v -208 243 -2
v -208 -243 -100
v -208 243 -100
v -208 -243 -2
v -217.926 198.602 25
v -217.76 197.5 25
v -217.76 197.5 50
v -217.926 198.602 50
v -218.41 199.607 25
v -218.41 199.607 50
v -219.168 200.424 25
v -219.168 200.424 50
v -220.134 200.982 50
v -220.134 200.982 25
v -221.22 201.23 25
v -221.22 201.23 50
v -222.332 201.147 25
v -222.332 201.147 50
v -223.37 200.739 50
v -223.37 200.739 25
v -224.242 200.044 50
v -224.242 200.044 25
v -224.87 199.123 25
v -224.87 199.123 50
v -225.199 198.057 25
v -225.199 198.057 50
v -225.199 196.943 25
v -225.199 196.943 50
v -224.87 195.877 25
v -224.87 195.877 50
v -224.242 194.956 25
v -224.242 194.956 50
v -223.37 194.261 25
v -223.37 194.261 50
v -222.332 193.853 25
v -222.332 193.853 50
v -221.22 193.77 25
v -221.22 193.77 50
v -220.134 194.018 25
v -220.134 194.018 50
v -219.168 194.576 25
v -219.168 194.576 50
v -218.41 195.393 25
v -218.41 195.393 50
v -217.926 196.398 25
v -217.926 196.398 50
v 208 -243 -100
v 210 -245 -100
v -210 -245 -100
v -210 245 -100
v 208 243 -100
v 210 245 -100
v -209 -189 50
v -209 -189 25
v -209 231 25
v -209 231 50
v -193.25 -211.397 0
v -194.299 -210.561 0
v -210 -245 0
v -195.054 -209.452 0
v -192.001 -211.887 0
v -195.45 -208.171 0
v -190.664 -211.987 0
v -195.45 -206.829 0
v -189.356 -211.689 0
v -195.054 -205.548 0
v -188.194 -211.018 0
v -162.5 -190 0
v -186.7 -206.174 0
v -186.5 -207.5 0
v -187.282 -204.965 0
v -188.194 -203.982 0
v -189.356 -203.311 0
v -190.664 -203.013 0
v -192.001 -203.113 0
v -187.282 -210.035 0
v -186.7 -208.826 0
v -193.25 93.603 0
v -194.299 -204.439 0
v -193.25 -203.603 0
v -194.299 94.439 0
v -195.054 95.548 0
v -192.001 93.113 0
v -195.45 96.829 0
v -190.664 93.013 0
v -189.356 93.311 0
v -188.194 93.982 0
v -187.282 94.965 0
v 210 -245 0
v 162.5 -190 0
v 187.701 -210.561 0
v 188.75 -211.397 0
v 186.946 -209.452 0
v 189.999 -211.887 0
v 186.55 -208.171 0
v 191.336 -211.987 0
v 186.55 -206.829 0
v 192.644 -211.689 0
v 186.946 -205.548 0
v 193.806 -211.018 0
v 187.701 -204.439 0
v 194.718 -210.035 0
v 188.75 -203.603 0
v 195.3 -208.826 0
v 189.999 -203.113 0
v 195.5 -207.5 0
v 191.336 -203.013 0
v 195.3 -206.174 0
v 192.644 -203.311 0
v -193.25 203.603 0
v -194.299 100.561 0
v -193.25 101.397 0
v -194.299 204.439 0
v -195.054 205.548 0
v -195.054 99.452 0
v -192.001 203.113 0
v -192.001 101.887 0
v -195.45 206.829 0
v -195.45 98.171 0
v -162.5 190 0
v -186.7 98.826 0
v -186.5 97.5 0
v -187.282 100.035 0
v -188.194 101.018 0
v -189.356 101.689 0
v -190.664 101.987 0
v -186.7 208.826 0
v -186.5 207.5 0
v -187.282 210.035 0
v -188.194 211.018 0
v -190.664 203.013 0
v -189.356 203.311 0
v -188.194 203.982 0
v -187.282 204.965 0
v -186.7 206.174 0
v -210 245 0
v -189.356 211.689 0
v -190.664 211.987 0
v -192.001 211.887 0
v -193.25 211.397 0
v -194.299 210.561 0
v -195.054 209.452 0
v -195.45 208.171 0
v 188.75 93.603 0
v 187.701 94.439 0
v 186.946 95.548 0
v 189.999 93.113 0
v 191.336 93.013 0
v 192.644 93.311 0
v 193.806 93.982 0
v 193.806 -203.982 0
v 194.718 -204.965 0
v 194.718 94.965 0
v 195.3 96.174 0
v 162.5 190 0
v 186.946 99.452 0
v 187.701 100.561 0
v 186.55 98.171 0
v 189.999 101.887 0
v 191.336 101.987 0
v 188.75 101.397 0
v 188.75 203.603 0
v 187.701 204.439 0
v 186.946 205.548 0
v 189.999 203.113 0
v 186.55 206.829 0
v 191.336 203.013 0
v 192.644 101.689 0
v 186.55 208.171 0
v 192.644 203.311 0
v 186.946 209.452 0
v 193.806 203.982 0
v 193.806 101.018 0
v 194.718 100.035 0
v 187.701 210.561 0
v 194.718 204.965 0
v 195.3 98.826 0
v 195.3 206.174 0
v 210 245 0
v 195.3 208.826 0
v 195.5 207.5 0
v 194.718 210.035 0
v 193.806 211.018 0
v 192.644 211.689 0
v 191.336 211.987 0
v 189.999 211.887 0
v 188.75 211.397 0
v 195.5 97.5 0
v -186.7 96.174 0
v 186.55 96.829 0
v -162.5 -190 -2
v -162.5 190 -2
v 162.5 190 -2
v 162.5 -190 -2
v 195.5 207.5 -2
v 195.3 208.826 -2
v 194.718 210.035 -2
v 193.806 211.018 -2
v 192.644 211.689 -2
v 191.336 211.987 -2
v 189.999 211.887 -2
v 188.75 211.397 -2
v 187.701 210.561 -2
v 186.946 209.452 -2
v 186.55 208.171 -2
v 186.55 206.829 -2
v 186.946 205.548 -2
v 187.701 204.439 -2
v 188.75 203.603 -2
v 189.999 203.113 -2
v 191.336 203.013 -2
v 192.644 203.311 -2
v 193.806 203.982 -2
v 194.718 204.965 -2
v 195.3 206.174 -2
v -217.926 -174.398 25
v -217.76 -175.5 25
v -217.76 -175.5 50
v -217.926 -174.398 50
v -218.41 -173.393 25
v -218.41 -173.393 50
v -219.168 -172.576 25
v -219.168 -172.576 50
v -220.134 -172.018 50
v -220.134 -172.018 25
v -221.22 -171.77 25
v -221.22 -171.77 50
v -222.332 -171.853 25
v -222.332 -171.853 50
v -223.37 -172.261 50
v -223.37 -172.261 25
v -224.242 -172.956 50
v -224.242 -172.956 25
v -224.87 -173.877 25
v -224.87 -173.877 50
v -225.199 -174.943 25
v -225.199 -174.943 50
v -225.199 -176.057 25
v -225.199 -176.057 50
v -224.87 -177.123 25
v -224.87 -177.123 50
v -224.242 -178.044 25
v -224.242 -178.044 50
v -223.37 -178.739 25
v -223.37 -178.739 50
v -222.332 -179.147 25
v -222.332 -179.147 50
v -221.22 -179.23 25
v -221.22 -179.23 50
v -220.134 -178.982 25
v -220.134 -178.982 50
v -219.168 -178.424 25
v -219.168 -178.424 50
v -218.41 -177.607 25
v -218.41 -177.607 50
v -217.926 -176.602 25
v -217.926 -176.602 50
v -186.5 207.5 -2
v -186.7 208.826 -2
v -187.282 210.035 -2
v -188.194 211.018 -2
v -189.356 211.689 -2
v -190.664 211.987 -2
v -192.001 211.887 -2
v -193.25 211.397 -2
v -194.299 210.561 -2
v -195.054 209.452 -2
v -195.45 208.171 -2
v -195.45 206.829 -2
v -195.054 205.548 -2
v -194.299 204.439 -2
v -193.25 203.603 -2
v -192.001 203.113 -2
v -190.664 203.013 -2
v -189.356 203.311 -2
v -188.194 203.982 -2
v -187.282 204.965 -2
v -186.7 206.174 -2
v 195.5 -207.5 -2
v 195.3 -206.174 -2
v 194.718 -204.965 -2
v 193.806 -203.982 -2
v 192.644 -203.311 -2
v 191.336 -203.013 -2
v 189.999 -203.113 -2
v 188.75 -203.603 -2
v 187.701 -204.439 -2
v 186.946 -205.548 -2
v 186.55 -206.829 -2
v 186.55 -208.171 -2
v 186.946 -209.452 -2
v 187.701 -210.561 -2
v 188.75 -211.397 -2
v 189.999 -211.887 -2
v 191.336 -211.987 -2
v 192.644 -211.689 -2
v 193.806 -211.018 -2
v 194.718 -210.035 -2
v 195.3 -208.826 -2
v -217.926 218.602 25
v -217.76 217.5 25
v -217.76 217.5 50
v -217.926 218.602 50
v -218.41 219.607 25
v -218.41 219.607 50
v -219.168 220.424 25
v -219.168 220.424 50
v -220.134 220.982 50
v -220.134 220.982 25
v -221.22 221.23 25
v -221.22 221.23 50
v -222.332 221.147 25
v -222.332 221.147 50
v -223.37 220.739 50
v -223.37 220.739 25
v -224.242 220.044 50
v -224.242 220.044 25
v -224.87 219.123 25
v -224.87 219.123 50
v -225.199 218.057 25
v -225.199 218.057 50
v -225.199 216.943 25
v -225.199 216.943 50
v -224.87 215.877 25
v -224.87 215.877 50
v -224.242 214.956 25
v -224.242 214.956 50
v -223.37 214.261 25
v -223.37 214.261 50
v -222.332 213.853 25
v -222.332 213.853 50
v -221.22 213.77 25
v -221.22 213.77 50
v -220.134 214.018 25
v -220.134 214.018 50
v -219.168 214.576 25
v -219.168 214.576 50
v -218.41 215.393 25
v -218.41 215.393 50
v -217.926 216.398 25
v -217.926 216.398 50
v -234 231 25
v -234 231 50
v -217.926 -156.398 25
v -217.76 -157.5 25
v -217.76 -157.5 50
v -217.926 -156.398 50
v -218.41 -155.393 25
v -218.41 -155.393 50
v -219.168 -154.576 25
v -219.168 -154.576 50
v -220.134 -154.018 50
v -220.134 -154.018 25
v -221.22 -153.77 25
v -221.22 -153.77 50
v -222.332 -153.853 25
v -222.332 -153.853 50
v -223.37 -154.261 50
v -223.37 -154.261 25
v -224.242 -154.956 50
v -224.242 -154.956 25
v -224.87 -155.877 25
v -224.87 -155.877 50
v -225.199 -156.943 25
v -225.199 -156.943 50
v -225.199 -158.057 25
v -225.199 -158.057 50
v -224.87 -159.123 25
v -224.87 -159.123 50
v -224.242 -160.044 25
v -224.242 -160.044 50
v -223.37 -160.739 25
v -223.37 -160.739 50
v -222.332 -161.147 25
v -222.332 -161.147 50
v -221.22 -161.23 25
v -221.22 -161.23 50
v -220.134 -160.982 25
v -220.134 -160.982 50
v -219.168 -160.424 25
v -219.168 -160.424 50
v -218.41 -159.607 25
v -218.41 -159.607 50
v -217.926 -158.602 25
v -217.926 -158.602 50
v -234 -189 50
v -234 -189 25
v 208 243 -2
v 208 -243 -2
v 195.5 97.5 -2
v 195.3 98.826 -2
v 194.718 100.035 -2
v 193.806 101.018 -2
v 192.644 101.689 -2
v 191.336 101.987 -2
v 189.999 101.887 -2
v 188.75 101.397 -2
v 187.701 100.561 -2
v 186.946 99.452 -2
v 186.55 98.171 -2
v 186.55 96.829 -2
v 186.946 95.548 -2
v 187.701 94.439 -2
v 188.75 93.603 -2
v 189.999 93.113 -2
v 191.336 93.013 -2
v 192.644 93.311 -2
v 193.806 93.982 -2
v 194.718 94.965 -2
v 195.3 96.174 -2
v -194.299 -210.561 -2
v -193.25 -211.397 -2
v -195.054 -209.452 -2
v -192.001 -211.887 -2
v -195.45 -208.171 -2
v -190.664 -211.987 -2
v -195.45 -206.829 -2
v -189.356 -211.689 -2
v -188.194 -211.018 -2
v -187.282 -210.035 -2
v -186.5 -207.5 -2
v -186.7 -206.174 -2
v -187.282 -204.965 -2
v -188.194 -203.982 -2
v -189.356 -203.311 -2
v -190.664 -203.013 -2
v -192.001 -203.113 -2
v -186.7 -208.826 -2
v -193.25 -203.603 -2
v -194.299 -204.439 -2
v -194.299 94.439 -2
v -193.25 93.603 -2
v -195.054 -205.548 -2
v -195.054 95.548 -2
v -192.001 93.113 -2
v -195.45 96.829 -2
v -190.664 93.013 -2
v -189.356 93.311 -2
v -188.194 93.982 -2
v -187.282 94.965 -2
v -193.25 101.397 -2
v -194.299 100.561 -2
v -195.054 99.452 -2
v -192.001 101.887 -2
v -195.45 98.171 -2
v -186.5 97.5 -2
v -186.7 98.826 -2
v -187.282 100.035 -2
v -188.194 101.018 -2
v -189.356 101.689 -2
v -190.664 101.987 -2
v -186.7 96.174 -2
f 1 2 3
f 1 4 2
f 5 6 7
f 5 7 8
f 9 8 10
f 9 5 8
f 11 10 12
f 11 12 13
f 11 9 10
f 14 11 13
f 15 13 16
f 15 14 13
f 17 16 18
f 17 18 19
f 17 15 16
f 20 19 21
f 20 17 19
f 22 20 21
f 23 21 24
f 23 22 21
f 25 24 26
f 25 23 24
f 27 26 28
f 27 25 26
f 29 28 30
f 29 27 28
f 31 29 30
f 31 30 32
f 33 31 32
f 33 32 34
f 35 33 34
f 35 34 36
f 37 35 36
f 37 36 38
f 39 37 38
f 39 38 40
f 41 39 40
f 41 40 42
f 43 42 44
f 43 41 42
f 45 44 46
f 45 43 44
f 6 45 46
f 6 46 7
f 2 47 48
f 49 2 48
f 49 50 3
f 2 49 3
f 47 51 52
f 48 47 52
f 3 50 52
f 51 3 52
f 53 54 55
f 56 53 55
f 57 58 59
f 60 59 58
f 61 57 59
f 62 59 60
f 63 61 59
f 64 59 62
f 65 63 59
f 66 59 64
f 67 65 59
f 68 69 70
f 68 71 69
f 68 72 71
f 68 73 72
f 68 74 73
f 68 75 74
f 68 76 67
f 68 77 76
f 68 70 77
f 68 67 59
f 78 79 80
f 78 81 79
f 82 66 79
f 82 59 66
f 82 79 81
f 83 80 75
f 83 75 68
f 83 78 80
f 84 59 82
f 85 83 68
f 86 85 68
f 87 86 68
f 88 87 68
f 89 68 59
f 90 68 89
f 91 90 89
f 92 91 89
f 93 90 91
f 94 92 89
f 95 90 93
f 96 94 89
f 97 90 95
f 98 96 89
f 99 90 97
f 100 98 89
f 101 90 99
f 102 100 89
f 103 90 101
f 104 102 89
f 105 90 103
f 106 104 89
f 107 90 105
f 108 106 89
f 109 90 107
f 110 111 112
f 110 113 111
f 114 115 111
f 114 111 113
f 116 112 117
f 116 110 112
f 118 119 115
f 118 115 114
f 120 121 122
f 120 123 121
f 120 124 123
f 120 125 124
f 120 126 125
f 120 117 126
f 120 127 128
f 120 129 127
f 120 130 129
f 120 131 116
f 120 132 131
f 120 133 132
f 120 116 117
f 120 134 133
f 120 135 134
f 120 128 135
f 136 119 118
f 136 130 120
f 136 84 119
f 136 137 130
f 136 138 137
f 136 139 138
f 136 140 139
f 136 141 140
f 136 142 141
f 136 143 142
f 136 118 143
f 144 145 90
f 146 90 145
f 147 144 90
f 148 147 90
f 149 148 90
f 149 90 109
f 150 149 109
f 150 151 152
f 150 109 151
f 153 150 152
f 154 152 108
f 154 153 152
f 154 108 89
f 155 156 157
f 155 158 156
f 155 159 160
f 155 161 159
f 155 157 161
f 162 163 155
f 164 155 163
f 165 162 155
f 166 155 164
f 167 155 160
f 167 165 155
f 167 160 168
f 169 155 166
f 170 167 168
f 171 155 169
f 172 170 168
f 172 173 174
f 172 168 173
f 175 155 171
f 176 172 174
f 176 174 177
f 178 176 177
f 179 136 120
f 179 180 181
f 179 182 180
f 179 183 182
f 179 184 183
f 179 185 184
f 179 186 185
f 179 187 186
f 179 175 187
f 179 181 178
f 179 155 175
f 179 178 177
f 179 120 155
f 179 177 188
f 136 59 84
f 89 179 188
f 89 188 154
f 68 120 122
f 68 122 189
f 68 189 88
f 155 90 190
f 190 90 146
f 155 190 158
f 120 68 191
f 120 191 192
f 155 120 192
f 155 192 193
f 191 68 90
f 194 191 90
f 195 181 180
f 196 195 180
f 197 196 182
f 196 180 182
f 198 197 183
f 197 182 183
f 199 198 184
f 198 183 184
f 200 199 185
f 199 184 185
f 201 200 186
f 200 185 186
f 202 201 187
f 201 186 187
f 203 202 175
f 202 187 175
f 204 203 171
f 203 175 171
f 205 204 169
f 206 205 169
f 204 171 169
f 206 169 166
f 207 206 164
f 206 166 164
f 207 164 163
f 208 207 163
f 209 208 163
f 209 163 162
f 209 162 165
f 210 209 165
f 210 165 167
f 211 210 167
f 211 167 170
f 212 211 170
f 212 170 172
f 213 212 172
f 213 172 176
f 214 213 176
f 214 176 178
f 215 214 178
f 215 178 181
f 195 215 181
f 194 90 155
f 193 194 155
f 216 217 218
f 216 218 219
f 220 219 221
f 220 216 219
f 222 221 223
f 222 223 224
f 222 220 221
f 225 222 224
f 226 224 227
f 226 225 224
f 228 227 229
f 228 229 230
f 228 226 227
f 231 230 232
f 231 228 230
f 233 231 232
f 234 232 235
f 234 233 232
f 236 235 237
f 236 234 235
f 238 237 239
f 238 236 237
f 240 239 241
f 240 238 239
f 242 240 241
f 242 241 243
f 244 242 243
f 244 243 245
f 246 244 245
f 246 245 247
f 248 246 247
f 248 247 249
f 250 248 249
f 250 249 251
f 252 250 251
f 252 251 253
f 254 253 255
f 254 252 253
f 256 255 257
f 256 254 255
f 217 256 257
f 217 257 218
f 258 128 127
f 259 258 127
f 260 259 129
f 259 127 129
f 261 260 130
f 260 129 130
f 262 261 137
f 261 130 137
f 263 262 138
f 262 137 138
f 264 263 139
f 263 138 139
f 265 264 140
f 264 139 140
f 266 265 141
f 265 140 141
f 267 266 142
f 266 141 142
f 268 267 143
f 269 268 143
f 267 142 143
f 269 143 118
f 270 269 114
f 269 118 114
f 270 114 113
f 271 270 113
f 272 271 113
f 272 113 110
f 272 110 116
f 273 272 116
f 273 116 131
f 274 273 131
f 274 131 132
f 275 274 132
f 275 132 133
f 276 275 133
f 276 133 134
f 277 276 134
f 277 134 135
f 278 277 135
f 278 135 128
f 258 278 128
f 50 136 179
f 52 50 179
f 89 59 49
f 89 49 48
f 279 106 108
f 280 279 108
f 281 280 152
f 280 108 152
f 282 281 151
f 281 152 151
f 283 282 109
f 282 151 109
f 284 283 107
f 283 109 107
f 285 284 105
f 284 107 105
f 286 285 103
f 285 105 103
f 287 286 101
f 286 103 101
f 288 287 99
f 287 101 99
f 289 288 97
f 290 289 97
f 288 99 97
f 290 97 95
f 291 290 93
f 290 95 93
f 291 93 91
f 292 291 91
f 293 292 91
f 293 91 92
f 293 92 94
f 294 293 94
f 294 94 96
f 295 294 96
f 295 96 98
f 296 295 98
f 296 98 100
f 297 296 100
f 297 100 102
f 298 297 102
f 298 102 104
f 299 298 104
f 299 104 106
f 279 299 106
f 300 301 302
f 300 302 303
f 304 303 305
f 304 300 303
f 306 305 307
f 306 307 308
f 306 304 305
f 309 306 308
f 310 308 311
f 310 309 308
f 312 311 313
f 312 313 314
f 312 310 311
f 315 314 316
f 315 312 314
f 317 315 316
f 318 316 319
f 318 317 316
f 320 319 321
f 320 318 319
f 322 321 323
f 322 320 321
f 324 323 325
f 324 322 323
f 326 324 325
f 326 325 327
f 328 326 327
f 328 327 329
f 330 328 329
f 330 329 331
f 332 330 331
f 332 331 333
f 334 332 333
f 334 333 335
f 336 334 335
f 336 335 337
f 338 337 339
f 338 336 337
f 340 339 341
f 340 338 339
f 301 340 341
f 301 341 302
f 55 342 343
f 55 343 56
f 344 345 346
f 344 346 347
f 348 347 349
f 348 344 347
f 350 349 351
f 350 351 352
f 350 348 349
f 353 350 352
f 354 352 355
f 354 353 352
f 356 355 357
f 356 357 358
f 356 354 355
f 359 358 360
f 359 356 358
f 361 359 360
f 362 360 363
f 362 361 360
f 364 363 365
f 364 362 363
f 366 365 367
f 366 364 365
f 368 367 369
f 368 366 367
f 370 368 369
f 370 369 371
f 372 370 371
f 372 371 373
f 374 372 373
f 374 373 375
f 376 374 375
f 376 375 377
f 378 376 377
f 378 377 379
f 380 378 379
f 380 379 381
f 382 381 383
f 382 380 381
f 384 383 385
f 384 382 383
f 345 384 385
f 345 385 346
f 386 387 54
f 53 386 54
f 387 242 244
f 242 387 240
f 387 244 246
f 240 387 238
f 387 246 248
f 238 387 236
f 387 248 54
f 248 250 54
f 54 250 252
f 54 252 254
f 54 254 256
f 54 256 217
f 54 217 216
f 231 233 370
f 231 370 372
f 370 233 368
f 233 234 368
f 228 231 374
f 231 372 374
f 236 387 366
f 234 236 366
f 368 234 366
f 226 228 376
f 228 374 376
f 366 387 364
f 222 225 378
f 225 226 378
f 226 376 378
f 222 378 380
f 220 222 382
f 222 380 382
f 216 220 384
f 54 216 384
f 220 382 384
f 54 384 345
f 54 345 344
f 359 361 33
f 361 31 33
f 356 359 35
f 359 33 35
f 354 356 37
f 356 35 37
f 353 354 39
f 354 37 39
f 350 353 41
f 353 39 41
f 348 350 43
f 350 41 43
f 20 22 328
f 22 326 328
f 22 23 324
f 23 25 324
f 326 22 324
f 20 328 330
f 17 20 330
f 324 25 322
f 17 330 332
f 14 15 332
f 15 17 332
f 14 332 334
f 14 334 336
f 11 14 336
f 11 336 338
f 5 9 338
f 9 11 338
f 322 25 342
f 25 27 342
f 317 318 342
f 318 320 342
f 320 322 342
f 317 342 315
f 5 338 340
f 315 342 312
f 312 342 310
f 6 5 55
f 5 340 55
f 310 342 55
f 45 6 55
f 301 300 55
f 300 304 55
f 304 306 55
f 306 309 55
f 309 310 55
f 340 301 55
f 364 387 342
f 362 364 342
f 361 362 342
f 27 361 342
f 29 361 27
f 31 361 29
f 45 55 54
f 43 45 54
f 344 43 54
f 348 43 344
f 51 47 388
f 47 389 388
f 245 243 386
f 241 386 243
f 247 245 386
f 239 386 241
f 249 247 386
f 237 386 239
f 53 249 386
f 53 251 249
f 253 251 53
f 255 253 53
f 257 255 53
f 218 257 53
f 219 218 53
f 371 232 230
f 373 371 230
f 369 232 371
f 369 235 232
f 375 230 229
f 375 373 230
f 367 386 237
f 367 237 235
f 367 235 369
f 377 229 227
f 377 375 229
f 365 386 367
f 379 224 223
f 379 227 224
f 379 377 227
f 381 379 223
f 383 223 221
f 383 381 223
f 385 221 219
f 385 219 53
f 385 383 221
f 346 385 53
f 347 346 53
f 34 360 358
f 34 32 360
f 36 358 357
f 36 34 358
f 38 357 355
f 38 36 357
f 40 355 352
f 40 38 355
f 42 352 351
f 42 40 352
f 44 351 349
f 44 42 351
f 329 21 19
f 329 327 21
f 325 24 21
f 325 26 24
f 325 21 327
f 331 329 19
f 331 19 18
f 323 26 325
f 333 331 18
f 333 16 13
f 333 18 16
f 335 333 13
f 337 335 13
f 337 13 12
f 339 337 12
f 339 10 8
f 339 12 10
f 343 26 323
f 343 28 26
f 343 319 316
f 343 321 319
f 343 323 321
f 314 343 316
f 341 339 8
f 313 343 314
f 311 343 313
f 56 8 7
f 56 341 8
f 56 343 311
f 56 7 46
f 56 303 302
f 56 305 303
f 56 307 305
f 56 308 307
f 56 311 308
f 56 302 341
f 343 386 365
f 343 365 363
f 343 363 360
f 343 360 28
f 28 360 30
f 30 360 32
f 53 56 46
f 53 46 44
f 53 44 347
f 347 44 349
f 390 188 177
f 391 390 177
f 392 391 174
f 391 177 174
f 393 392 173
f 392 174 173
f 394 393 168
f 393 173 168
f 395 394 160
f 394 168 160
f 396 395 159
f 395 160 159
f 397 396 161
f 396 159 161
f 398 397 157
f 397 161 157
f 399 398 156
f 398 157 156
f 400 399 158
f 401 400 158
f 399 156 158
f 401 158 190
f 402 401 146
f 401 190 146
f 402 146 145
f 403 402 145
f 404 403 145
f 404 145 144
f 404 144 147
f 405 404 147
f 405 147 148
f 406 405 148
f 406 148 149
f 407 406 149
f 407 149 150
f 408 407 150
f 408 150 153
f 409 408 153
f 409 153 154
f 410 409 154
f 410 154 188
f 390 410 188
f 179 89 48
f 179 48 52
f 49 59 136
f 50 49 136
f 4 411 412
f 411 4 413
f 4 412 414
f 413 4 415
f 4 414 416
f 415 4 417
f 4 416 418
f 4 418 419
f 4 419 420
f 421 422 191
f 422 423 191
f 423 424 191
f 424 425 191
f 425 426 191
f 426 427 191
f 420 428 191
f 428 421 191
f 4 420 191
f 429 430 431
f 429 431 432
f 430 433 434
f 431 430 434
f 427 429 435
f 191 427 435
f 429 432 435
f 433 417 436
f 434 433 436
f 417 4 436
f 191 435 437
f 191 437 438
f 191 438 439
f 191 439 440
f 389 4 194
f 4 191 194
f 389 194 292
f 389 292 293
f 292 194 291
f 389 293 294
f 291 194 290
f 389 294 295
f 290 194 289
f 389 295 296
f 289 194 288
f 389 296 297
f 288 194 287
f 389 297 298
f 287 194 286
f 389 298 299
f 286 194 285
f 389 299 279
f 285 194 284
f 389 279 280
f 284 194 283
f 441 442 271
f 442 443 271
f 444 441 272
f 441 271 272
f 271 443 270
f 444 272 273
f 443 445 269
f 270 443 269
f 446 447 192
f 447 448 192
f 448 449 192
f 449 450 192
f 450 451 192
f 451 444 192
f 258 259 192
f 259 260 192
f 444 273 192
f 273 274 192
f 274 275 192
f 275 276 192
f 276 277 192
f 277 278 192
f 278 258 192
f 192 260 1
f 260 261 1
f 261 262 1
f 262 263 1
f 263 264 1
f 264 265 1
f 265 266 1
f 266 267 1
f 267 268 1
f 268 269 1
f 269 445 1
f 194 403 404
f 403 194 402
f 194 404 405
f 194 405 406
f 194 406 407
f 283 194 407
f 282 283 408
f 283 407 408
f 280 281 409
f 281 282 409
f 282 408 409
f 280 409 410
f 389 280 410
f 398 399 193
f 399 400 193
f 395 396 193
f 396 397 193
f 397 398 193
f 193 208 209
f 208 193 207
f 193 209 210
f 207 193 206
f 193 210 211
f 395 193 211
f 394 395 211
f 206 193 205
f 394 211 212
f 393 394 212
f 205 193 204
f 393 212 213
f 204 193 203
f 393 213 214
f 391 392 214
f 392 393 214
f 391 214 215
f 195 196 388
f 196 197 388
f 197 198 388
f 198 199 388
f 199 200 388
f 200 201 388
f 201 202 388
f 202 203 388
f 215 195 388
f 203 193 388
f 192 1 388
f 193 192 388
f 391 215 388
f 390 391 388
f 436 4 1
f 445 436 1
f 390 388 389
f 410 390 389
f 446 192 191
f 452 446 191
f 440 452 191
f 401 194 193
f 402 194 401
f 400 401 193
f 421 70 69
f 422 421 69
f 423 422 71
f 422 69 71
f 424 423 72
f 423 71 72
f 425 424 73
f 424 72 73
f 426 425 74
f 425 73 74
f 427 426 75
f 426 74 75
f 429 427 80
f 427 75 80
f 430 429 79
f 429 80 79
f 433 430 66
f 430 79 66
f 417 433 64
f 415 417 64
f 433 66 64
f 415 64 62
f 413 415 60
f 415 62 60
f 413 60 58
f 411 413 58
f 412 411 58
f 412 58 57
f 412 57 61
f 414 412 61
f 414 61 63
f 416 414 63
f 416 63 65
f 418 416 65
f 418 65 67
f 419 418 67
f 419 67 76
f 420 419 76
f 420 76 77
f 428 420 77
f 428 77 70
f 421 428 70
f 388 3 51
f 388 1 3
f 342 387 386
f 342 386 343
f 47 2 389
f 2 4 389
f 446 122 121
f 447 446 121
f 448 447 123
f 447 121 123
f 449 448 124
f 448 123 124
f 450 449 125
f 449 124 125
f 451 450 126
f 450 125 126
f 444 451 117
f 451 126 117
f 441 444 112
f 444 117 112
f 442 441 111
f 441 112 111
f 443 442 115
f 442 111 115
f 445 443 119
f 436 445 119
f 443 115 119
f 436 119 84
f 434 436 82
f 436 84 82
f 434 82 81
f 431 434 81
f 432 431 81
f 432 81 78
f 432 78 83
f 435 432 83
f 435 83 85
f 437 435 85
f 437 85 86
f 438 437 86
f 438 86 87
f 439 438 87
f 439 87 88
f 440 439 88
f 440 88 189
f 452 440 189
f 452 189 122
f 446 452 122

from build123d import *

# Parameters (mm, degrees)
F0_W      = 420
F0_H      = 490
F1_DEPTH  = 100
F2_T      = -2
F3_W      = 325
F3_H      = 380
F4_DEPTH  = 25
F5_R      = 4.5
F6_DEPTH  = 25
F8_W      = 25
F8_H      = 420
F9_DEPTH  = 25
F10_R     = 3.740286
F11_DEPTH = 25


with BuildPart() as f1:
    # F0 (on Top) → F1 (new body)
    with BuildSketch(Plane.XY):
        Rectangle(F0_W, F0_H)
    extrude(amount=-F1_DEPTH)

    # F2
    f2_openings = [f1.faces().sort_by_distance(p)[0] for p in [
        (0, 0, -100),
    ]]
    offset(amount=F2_T, openings=f2_openings)

    # F3 (on face) → F4 (cut)
    with BuildSketch(Plane.XY):
        Rectangle(F3_W, F3_H)
    extrude(amount=-F4_DEPTH, mode=Mode.SUBTRACT)

    # F5 (on Top) → F6 (cut)
    with BuildSketch(Plane.XY):
        with Locations((-191, -207.5)):
            Circle(F5_R)
        with Locations((-191, 97.5)):
            Circle(F5_R)
        with Locations((-191, 207.5)):
            Circle(F5_R)
        with Locations((191, 207.5)):
            Circle(F5_R)
        with Locations((191, -207.5)):
            Circle(F5_R)
        with Locations((191, 97.5)):
            Circle(F5_R)
    extrude(amount=-F6_DEPTH, mode=Mode.SUBTRACT)


with BuildPart() as f9:
    # F8 (on offset) → F9 (new body)
    with BuildSketch(Plane.XY.offset(25)):
        with Locations((-221.5, 21)):
            Rectangle(F8_W, F8_H)
    extrude(amount=F9_DEPTH)

    # F10 (on offset) → F11 (cut)
    with BuildSketch(Plane.XY.offset(25)):
        with Locations((-221.5, 217.5)):
            Circle(F10_R)
        with Locations((-221.5, 197.5)):
            Circle(F10_R)
        with Locations((-221.5, -175.5)):
            Circle(F10_R)
        with Locations((-221.5, -157.5)):
            Circle(F10_R)
    extrude(amount=F11_DEPTH, mode=Mode.SUBTRACT)


solid = Compound([f1.part, f9.part])
